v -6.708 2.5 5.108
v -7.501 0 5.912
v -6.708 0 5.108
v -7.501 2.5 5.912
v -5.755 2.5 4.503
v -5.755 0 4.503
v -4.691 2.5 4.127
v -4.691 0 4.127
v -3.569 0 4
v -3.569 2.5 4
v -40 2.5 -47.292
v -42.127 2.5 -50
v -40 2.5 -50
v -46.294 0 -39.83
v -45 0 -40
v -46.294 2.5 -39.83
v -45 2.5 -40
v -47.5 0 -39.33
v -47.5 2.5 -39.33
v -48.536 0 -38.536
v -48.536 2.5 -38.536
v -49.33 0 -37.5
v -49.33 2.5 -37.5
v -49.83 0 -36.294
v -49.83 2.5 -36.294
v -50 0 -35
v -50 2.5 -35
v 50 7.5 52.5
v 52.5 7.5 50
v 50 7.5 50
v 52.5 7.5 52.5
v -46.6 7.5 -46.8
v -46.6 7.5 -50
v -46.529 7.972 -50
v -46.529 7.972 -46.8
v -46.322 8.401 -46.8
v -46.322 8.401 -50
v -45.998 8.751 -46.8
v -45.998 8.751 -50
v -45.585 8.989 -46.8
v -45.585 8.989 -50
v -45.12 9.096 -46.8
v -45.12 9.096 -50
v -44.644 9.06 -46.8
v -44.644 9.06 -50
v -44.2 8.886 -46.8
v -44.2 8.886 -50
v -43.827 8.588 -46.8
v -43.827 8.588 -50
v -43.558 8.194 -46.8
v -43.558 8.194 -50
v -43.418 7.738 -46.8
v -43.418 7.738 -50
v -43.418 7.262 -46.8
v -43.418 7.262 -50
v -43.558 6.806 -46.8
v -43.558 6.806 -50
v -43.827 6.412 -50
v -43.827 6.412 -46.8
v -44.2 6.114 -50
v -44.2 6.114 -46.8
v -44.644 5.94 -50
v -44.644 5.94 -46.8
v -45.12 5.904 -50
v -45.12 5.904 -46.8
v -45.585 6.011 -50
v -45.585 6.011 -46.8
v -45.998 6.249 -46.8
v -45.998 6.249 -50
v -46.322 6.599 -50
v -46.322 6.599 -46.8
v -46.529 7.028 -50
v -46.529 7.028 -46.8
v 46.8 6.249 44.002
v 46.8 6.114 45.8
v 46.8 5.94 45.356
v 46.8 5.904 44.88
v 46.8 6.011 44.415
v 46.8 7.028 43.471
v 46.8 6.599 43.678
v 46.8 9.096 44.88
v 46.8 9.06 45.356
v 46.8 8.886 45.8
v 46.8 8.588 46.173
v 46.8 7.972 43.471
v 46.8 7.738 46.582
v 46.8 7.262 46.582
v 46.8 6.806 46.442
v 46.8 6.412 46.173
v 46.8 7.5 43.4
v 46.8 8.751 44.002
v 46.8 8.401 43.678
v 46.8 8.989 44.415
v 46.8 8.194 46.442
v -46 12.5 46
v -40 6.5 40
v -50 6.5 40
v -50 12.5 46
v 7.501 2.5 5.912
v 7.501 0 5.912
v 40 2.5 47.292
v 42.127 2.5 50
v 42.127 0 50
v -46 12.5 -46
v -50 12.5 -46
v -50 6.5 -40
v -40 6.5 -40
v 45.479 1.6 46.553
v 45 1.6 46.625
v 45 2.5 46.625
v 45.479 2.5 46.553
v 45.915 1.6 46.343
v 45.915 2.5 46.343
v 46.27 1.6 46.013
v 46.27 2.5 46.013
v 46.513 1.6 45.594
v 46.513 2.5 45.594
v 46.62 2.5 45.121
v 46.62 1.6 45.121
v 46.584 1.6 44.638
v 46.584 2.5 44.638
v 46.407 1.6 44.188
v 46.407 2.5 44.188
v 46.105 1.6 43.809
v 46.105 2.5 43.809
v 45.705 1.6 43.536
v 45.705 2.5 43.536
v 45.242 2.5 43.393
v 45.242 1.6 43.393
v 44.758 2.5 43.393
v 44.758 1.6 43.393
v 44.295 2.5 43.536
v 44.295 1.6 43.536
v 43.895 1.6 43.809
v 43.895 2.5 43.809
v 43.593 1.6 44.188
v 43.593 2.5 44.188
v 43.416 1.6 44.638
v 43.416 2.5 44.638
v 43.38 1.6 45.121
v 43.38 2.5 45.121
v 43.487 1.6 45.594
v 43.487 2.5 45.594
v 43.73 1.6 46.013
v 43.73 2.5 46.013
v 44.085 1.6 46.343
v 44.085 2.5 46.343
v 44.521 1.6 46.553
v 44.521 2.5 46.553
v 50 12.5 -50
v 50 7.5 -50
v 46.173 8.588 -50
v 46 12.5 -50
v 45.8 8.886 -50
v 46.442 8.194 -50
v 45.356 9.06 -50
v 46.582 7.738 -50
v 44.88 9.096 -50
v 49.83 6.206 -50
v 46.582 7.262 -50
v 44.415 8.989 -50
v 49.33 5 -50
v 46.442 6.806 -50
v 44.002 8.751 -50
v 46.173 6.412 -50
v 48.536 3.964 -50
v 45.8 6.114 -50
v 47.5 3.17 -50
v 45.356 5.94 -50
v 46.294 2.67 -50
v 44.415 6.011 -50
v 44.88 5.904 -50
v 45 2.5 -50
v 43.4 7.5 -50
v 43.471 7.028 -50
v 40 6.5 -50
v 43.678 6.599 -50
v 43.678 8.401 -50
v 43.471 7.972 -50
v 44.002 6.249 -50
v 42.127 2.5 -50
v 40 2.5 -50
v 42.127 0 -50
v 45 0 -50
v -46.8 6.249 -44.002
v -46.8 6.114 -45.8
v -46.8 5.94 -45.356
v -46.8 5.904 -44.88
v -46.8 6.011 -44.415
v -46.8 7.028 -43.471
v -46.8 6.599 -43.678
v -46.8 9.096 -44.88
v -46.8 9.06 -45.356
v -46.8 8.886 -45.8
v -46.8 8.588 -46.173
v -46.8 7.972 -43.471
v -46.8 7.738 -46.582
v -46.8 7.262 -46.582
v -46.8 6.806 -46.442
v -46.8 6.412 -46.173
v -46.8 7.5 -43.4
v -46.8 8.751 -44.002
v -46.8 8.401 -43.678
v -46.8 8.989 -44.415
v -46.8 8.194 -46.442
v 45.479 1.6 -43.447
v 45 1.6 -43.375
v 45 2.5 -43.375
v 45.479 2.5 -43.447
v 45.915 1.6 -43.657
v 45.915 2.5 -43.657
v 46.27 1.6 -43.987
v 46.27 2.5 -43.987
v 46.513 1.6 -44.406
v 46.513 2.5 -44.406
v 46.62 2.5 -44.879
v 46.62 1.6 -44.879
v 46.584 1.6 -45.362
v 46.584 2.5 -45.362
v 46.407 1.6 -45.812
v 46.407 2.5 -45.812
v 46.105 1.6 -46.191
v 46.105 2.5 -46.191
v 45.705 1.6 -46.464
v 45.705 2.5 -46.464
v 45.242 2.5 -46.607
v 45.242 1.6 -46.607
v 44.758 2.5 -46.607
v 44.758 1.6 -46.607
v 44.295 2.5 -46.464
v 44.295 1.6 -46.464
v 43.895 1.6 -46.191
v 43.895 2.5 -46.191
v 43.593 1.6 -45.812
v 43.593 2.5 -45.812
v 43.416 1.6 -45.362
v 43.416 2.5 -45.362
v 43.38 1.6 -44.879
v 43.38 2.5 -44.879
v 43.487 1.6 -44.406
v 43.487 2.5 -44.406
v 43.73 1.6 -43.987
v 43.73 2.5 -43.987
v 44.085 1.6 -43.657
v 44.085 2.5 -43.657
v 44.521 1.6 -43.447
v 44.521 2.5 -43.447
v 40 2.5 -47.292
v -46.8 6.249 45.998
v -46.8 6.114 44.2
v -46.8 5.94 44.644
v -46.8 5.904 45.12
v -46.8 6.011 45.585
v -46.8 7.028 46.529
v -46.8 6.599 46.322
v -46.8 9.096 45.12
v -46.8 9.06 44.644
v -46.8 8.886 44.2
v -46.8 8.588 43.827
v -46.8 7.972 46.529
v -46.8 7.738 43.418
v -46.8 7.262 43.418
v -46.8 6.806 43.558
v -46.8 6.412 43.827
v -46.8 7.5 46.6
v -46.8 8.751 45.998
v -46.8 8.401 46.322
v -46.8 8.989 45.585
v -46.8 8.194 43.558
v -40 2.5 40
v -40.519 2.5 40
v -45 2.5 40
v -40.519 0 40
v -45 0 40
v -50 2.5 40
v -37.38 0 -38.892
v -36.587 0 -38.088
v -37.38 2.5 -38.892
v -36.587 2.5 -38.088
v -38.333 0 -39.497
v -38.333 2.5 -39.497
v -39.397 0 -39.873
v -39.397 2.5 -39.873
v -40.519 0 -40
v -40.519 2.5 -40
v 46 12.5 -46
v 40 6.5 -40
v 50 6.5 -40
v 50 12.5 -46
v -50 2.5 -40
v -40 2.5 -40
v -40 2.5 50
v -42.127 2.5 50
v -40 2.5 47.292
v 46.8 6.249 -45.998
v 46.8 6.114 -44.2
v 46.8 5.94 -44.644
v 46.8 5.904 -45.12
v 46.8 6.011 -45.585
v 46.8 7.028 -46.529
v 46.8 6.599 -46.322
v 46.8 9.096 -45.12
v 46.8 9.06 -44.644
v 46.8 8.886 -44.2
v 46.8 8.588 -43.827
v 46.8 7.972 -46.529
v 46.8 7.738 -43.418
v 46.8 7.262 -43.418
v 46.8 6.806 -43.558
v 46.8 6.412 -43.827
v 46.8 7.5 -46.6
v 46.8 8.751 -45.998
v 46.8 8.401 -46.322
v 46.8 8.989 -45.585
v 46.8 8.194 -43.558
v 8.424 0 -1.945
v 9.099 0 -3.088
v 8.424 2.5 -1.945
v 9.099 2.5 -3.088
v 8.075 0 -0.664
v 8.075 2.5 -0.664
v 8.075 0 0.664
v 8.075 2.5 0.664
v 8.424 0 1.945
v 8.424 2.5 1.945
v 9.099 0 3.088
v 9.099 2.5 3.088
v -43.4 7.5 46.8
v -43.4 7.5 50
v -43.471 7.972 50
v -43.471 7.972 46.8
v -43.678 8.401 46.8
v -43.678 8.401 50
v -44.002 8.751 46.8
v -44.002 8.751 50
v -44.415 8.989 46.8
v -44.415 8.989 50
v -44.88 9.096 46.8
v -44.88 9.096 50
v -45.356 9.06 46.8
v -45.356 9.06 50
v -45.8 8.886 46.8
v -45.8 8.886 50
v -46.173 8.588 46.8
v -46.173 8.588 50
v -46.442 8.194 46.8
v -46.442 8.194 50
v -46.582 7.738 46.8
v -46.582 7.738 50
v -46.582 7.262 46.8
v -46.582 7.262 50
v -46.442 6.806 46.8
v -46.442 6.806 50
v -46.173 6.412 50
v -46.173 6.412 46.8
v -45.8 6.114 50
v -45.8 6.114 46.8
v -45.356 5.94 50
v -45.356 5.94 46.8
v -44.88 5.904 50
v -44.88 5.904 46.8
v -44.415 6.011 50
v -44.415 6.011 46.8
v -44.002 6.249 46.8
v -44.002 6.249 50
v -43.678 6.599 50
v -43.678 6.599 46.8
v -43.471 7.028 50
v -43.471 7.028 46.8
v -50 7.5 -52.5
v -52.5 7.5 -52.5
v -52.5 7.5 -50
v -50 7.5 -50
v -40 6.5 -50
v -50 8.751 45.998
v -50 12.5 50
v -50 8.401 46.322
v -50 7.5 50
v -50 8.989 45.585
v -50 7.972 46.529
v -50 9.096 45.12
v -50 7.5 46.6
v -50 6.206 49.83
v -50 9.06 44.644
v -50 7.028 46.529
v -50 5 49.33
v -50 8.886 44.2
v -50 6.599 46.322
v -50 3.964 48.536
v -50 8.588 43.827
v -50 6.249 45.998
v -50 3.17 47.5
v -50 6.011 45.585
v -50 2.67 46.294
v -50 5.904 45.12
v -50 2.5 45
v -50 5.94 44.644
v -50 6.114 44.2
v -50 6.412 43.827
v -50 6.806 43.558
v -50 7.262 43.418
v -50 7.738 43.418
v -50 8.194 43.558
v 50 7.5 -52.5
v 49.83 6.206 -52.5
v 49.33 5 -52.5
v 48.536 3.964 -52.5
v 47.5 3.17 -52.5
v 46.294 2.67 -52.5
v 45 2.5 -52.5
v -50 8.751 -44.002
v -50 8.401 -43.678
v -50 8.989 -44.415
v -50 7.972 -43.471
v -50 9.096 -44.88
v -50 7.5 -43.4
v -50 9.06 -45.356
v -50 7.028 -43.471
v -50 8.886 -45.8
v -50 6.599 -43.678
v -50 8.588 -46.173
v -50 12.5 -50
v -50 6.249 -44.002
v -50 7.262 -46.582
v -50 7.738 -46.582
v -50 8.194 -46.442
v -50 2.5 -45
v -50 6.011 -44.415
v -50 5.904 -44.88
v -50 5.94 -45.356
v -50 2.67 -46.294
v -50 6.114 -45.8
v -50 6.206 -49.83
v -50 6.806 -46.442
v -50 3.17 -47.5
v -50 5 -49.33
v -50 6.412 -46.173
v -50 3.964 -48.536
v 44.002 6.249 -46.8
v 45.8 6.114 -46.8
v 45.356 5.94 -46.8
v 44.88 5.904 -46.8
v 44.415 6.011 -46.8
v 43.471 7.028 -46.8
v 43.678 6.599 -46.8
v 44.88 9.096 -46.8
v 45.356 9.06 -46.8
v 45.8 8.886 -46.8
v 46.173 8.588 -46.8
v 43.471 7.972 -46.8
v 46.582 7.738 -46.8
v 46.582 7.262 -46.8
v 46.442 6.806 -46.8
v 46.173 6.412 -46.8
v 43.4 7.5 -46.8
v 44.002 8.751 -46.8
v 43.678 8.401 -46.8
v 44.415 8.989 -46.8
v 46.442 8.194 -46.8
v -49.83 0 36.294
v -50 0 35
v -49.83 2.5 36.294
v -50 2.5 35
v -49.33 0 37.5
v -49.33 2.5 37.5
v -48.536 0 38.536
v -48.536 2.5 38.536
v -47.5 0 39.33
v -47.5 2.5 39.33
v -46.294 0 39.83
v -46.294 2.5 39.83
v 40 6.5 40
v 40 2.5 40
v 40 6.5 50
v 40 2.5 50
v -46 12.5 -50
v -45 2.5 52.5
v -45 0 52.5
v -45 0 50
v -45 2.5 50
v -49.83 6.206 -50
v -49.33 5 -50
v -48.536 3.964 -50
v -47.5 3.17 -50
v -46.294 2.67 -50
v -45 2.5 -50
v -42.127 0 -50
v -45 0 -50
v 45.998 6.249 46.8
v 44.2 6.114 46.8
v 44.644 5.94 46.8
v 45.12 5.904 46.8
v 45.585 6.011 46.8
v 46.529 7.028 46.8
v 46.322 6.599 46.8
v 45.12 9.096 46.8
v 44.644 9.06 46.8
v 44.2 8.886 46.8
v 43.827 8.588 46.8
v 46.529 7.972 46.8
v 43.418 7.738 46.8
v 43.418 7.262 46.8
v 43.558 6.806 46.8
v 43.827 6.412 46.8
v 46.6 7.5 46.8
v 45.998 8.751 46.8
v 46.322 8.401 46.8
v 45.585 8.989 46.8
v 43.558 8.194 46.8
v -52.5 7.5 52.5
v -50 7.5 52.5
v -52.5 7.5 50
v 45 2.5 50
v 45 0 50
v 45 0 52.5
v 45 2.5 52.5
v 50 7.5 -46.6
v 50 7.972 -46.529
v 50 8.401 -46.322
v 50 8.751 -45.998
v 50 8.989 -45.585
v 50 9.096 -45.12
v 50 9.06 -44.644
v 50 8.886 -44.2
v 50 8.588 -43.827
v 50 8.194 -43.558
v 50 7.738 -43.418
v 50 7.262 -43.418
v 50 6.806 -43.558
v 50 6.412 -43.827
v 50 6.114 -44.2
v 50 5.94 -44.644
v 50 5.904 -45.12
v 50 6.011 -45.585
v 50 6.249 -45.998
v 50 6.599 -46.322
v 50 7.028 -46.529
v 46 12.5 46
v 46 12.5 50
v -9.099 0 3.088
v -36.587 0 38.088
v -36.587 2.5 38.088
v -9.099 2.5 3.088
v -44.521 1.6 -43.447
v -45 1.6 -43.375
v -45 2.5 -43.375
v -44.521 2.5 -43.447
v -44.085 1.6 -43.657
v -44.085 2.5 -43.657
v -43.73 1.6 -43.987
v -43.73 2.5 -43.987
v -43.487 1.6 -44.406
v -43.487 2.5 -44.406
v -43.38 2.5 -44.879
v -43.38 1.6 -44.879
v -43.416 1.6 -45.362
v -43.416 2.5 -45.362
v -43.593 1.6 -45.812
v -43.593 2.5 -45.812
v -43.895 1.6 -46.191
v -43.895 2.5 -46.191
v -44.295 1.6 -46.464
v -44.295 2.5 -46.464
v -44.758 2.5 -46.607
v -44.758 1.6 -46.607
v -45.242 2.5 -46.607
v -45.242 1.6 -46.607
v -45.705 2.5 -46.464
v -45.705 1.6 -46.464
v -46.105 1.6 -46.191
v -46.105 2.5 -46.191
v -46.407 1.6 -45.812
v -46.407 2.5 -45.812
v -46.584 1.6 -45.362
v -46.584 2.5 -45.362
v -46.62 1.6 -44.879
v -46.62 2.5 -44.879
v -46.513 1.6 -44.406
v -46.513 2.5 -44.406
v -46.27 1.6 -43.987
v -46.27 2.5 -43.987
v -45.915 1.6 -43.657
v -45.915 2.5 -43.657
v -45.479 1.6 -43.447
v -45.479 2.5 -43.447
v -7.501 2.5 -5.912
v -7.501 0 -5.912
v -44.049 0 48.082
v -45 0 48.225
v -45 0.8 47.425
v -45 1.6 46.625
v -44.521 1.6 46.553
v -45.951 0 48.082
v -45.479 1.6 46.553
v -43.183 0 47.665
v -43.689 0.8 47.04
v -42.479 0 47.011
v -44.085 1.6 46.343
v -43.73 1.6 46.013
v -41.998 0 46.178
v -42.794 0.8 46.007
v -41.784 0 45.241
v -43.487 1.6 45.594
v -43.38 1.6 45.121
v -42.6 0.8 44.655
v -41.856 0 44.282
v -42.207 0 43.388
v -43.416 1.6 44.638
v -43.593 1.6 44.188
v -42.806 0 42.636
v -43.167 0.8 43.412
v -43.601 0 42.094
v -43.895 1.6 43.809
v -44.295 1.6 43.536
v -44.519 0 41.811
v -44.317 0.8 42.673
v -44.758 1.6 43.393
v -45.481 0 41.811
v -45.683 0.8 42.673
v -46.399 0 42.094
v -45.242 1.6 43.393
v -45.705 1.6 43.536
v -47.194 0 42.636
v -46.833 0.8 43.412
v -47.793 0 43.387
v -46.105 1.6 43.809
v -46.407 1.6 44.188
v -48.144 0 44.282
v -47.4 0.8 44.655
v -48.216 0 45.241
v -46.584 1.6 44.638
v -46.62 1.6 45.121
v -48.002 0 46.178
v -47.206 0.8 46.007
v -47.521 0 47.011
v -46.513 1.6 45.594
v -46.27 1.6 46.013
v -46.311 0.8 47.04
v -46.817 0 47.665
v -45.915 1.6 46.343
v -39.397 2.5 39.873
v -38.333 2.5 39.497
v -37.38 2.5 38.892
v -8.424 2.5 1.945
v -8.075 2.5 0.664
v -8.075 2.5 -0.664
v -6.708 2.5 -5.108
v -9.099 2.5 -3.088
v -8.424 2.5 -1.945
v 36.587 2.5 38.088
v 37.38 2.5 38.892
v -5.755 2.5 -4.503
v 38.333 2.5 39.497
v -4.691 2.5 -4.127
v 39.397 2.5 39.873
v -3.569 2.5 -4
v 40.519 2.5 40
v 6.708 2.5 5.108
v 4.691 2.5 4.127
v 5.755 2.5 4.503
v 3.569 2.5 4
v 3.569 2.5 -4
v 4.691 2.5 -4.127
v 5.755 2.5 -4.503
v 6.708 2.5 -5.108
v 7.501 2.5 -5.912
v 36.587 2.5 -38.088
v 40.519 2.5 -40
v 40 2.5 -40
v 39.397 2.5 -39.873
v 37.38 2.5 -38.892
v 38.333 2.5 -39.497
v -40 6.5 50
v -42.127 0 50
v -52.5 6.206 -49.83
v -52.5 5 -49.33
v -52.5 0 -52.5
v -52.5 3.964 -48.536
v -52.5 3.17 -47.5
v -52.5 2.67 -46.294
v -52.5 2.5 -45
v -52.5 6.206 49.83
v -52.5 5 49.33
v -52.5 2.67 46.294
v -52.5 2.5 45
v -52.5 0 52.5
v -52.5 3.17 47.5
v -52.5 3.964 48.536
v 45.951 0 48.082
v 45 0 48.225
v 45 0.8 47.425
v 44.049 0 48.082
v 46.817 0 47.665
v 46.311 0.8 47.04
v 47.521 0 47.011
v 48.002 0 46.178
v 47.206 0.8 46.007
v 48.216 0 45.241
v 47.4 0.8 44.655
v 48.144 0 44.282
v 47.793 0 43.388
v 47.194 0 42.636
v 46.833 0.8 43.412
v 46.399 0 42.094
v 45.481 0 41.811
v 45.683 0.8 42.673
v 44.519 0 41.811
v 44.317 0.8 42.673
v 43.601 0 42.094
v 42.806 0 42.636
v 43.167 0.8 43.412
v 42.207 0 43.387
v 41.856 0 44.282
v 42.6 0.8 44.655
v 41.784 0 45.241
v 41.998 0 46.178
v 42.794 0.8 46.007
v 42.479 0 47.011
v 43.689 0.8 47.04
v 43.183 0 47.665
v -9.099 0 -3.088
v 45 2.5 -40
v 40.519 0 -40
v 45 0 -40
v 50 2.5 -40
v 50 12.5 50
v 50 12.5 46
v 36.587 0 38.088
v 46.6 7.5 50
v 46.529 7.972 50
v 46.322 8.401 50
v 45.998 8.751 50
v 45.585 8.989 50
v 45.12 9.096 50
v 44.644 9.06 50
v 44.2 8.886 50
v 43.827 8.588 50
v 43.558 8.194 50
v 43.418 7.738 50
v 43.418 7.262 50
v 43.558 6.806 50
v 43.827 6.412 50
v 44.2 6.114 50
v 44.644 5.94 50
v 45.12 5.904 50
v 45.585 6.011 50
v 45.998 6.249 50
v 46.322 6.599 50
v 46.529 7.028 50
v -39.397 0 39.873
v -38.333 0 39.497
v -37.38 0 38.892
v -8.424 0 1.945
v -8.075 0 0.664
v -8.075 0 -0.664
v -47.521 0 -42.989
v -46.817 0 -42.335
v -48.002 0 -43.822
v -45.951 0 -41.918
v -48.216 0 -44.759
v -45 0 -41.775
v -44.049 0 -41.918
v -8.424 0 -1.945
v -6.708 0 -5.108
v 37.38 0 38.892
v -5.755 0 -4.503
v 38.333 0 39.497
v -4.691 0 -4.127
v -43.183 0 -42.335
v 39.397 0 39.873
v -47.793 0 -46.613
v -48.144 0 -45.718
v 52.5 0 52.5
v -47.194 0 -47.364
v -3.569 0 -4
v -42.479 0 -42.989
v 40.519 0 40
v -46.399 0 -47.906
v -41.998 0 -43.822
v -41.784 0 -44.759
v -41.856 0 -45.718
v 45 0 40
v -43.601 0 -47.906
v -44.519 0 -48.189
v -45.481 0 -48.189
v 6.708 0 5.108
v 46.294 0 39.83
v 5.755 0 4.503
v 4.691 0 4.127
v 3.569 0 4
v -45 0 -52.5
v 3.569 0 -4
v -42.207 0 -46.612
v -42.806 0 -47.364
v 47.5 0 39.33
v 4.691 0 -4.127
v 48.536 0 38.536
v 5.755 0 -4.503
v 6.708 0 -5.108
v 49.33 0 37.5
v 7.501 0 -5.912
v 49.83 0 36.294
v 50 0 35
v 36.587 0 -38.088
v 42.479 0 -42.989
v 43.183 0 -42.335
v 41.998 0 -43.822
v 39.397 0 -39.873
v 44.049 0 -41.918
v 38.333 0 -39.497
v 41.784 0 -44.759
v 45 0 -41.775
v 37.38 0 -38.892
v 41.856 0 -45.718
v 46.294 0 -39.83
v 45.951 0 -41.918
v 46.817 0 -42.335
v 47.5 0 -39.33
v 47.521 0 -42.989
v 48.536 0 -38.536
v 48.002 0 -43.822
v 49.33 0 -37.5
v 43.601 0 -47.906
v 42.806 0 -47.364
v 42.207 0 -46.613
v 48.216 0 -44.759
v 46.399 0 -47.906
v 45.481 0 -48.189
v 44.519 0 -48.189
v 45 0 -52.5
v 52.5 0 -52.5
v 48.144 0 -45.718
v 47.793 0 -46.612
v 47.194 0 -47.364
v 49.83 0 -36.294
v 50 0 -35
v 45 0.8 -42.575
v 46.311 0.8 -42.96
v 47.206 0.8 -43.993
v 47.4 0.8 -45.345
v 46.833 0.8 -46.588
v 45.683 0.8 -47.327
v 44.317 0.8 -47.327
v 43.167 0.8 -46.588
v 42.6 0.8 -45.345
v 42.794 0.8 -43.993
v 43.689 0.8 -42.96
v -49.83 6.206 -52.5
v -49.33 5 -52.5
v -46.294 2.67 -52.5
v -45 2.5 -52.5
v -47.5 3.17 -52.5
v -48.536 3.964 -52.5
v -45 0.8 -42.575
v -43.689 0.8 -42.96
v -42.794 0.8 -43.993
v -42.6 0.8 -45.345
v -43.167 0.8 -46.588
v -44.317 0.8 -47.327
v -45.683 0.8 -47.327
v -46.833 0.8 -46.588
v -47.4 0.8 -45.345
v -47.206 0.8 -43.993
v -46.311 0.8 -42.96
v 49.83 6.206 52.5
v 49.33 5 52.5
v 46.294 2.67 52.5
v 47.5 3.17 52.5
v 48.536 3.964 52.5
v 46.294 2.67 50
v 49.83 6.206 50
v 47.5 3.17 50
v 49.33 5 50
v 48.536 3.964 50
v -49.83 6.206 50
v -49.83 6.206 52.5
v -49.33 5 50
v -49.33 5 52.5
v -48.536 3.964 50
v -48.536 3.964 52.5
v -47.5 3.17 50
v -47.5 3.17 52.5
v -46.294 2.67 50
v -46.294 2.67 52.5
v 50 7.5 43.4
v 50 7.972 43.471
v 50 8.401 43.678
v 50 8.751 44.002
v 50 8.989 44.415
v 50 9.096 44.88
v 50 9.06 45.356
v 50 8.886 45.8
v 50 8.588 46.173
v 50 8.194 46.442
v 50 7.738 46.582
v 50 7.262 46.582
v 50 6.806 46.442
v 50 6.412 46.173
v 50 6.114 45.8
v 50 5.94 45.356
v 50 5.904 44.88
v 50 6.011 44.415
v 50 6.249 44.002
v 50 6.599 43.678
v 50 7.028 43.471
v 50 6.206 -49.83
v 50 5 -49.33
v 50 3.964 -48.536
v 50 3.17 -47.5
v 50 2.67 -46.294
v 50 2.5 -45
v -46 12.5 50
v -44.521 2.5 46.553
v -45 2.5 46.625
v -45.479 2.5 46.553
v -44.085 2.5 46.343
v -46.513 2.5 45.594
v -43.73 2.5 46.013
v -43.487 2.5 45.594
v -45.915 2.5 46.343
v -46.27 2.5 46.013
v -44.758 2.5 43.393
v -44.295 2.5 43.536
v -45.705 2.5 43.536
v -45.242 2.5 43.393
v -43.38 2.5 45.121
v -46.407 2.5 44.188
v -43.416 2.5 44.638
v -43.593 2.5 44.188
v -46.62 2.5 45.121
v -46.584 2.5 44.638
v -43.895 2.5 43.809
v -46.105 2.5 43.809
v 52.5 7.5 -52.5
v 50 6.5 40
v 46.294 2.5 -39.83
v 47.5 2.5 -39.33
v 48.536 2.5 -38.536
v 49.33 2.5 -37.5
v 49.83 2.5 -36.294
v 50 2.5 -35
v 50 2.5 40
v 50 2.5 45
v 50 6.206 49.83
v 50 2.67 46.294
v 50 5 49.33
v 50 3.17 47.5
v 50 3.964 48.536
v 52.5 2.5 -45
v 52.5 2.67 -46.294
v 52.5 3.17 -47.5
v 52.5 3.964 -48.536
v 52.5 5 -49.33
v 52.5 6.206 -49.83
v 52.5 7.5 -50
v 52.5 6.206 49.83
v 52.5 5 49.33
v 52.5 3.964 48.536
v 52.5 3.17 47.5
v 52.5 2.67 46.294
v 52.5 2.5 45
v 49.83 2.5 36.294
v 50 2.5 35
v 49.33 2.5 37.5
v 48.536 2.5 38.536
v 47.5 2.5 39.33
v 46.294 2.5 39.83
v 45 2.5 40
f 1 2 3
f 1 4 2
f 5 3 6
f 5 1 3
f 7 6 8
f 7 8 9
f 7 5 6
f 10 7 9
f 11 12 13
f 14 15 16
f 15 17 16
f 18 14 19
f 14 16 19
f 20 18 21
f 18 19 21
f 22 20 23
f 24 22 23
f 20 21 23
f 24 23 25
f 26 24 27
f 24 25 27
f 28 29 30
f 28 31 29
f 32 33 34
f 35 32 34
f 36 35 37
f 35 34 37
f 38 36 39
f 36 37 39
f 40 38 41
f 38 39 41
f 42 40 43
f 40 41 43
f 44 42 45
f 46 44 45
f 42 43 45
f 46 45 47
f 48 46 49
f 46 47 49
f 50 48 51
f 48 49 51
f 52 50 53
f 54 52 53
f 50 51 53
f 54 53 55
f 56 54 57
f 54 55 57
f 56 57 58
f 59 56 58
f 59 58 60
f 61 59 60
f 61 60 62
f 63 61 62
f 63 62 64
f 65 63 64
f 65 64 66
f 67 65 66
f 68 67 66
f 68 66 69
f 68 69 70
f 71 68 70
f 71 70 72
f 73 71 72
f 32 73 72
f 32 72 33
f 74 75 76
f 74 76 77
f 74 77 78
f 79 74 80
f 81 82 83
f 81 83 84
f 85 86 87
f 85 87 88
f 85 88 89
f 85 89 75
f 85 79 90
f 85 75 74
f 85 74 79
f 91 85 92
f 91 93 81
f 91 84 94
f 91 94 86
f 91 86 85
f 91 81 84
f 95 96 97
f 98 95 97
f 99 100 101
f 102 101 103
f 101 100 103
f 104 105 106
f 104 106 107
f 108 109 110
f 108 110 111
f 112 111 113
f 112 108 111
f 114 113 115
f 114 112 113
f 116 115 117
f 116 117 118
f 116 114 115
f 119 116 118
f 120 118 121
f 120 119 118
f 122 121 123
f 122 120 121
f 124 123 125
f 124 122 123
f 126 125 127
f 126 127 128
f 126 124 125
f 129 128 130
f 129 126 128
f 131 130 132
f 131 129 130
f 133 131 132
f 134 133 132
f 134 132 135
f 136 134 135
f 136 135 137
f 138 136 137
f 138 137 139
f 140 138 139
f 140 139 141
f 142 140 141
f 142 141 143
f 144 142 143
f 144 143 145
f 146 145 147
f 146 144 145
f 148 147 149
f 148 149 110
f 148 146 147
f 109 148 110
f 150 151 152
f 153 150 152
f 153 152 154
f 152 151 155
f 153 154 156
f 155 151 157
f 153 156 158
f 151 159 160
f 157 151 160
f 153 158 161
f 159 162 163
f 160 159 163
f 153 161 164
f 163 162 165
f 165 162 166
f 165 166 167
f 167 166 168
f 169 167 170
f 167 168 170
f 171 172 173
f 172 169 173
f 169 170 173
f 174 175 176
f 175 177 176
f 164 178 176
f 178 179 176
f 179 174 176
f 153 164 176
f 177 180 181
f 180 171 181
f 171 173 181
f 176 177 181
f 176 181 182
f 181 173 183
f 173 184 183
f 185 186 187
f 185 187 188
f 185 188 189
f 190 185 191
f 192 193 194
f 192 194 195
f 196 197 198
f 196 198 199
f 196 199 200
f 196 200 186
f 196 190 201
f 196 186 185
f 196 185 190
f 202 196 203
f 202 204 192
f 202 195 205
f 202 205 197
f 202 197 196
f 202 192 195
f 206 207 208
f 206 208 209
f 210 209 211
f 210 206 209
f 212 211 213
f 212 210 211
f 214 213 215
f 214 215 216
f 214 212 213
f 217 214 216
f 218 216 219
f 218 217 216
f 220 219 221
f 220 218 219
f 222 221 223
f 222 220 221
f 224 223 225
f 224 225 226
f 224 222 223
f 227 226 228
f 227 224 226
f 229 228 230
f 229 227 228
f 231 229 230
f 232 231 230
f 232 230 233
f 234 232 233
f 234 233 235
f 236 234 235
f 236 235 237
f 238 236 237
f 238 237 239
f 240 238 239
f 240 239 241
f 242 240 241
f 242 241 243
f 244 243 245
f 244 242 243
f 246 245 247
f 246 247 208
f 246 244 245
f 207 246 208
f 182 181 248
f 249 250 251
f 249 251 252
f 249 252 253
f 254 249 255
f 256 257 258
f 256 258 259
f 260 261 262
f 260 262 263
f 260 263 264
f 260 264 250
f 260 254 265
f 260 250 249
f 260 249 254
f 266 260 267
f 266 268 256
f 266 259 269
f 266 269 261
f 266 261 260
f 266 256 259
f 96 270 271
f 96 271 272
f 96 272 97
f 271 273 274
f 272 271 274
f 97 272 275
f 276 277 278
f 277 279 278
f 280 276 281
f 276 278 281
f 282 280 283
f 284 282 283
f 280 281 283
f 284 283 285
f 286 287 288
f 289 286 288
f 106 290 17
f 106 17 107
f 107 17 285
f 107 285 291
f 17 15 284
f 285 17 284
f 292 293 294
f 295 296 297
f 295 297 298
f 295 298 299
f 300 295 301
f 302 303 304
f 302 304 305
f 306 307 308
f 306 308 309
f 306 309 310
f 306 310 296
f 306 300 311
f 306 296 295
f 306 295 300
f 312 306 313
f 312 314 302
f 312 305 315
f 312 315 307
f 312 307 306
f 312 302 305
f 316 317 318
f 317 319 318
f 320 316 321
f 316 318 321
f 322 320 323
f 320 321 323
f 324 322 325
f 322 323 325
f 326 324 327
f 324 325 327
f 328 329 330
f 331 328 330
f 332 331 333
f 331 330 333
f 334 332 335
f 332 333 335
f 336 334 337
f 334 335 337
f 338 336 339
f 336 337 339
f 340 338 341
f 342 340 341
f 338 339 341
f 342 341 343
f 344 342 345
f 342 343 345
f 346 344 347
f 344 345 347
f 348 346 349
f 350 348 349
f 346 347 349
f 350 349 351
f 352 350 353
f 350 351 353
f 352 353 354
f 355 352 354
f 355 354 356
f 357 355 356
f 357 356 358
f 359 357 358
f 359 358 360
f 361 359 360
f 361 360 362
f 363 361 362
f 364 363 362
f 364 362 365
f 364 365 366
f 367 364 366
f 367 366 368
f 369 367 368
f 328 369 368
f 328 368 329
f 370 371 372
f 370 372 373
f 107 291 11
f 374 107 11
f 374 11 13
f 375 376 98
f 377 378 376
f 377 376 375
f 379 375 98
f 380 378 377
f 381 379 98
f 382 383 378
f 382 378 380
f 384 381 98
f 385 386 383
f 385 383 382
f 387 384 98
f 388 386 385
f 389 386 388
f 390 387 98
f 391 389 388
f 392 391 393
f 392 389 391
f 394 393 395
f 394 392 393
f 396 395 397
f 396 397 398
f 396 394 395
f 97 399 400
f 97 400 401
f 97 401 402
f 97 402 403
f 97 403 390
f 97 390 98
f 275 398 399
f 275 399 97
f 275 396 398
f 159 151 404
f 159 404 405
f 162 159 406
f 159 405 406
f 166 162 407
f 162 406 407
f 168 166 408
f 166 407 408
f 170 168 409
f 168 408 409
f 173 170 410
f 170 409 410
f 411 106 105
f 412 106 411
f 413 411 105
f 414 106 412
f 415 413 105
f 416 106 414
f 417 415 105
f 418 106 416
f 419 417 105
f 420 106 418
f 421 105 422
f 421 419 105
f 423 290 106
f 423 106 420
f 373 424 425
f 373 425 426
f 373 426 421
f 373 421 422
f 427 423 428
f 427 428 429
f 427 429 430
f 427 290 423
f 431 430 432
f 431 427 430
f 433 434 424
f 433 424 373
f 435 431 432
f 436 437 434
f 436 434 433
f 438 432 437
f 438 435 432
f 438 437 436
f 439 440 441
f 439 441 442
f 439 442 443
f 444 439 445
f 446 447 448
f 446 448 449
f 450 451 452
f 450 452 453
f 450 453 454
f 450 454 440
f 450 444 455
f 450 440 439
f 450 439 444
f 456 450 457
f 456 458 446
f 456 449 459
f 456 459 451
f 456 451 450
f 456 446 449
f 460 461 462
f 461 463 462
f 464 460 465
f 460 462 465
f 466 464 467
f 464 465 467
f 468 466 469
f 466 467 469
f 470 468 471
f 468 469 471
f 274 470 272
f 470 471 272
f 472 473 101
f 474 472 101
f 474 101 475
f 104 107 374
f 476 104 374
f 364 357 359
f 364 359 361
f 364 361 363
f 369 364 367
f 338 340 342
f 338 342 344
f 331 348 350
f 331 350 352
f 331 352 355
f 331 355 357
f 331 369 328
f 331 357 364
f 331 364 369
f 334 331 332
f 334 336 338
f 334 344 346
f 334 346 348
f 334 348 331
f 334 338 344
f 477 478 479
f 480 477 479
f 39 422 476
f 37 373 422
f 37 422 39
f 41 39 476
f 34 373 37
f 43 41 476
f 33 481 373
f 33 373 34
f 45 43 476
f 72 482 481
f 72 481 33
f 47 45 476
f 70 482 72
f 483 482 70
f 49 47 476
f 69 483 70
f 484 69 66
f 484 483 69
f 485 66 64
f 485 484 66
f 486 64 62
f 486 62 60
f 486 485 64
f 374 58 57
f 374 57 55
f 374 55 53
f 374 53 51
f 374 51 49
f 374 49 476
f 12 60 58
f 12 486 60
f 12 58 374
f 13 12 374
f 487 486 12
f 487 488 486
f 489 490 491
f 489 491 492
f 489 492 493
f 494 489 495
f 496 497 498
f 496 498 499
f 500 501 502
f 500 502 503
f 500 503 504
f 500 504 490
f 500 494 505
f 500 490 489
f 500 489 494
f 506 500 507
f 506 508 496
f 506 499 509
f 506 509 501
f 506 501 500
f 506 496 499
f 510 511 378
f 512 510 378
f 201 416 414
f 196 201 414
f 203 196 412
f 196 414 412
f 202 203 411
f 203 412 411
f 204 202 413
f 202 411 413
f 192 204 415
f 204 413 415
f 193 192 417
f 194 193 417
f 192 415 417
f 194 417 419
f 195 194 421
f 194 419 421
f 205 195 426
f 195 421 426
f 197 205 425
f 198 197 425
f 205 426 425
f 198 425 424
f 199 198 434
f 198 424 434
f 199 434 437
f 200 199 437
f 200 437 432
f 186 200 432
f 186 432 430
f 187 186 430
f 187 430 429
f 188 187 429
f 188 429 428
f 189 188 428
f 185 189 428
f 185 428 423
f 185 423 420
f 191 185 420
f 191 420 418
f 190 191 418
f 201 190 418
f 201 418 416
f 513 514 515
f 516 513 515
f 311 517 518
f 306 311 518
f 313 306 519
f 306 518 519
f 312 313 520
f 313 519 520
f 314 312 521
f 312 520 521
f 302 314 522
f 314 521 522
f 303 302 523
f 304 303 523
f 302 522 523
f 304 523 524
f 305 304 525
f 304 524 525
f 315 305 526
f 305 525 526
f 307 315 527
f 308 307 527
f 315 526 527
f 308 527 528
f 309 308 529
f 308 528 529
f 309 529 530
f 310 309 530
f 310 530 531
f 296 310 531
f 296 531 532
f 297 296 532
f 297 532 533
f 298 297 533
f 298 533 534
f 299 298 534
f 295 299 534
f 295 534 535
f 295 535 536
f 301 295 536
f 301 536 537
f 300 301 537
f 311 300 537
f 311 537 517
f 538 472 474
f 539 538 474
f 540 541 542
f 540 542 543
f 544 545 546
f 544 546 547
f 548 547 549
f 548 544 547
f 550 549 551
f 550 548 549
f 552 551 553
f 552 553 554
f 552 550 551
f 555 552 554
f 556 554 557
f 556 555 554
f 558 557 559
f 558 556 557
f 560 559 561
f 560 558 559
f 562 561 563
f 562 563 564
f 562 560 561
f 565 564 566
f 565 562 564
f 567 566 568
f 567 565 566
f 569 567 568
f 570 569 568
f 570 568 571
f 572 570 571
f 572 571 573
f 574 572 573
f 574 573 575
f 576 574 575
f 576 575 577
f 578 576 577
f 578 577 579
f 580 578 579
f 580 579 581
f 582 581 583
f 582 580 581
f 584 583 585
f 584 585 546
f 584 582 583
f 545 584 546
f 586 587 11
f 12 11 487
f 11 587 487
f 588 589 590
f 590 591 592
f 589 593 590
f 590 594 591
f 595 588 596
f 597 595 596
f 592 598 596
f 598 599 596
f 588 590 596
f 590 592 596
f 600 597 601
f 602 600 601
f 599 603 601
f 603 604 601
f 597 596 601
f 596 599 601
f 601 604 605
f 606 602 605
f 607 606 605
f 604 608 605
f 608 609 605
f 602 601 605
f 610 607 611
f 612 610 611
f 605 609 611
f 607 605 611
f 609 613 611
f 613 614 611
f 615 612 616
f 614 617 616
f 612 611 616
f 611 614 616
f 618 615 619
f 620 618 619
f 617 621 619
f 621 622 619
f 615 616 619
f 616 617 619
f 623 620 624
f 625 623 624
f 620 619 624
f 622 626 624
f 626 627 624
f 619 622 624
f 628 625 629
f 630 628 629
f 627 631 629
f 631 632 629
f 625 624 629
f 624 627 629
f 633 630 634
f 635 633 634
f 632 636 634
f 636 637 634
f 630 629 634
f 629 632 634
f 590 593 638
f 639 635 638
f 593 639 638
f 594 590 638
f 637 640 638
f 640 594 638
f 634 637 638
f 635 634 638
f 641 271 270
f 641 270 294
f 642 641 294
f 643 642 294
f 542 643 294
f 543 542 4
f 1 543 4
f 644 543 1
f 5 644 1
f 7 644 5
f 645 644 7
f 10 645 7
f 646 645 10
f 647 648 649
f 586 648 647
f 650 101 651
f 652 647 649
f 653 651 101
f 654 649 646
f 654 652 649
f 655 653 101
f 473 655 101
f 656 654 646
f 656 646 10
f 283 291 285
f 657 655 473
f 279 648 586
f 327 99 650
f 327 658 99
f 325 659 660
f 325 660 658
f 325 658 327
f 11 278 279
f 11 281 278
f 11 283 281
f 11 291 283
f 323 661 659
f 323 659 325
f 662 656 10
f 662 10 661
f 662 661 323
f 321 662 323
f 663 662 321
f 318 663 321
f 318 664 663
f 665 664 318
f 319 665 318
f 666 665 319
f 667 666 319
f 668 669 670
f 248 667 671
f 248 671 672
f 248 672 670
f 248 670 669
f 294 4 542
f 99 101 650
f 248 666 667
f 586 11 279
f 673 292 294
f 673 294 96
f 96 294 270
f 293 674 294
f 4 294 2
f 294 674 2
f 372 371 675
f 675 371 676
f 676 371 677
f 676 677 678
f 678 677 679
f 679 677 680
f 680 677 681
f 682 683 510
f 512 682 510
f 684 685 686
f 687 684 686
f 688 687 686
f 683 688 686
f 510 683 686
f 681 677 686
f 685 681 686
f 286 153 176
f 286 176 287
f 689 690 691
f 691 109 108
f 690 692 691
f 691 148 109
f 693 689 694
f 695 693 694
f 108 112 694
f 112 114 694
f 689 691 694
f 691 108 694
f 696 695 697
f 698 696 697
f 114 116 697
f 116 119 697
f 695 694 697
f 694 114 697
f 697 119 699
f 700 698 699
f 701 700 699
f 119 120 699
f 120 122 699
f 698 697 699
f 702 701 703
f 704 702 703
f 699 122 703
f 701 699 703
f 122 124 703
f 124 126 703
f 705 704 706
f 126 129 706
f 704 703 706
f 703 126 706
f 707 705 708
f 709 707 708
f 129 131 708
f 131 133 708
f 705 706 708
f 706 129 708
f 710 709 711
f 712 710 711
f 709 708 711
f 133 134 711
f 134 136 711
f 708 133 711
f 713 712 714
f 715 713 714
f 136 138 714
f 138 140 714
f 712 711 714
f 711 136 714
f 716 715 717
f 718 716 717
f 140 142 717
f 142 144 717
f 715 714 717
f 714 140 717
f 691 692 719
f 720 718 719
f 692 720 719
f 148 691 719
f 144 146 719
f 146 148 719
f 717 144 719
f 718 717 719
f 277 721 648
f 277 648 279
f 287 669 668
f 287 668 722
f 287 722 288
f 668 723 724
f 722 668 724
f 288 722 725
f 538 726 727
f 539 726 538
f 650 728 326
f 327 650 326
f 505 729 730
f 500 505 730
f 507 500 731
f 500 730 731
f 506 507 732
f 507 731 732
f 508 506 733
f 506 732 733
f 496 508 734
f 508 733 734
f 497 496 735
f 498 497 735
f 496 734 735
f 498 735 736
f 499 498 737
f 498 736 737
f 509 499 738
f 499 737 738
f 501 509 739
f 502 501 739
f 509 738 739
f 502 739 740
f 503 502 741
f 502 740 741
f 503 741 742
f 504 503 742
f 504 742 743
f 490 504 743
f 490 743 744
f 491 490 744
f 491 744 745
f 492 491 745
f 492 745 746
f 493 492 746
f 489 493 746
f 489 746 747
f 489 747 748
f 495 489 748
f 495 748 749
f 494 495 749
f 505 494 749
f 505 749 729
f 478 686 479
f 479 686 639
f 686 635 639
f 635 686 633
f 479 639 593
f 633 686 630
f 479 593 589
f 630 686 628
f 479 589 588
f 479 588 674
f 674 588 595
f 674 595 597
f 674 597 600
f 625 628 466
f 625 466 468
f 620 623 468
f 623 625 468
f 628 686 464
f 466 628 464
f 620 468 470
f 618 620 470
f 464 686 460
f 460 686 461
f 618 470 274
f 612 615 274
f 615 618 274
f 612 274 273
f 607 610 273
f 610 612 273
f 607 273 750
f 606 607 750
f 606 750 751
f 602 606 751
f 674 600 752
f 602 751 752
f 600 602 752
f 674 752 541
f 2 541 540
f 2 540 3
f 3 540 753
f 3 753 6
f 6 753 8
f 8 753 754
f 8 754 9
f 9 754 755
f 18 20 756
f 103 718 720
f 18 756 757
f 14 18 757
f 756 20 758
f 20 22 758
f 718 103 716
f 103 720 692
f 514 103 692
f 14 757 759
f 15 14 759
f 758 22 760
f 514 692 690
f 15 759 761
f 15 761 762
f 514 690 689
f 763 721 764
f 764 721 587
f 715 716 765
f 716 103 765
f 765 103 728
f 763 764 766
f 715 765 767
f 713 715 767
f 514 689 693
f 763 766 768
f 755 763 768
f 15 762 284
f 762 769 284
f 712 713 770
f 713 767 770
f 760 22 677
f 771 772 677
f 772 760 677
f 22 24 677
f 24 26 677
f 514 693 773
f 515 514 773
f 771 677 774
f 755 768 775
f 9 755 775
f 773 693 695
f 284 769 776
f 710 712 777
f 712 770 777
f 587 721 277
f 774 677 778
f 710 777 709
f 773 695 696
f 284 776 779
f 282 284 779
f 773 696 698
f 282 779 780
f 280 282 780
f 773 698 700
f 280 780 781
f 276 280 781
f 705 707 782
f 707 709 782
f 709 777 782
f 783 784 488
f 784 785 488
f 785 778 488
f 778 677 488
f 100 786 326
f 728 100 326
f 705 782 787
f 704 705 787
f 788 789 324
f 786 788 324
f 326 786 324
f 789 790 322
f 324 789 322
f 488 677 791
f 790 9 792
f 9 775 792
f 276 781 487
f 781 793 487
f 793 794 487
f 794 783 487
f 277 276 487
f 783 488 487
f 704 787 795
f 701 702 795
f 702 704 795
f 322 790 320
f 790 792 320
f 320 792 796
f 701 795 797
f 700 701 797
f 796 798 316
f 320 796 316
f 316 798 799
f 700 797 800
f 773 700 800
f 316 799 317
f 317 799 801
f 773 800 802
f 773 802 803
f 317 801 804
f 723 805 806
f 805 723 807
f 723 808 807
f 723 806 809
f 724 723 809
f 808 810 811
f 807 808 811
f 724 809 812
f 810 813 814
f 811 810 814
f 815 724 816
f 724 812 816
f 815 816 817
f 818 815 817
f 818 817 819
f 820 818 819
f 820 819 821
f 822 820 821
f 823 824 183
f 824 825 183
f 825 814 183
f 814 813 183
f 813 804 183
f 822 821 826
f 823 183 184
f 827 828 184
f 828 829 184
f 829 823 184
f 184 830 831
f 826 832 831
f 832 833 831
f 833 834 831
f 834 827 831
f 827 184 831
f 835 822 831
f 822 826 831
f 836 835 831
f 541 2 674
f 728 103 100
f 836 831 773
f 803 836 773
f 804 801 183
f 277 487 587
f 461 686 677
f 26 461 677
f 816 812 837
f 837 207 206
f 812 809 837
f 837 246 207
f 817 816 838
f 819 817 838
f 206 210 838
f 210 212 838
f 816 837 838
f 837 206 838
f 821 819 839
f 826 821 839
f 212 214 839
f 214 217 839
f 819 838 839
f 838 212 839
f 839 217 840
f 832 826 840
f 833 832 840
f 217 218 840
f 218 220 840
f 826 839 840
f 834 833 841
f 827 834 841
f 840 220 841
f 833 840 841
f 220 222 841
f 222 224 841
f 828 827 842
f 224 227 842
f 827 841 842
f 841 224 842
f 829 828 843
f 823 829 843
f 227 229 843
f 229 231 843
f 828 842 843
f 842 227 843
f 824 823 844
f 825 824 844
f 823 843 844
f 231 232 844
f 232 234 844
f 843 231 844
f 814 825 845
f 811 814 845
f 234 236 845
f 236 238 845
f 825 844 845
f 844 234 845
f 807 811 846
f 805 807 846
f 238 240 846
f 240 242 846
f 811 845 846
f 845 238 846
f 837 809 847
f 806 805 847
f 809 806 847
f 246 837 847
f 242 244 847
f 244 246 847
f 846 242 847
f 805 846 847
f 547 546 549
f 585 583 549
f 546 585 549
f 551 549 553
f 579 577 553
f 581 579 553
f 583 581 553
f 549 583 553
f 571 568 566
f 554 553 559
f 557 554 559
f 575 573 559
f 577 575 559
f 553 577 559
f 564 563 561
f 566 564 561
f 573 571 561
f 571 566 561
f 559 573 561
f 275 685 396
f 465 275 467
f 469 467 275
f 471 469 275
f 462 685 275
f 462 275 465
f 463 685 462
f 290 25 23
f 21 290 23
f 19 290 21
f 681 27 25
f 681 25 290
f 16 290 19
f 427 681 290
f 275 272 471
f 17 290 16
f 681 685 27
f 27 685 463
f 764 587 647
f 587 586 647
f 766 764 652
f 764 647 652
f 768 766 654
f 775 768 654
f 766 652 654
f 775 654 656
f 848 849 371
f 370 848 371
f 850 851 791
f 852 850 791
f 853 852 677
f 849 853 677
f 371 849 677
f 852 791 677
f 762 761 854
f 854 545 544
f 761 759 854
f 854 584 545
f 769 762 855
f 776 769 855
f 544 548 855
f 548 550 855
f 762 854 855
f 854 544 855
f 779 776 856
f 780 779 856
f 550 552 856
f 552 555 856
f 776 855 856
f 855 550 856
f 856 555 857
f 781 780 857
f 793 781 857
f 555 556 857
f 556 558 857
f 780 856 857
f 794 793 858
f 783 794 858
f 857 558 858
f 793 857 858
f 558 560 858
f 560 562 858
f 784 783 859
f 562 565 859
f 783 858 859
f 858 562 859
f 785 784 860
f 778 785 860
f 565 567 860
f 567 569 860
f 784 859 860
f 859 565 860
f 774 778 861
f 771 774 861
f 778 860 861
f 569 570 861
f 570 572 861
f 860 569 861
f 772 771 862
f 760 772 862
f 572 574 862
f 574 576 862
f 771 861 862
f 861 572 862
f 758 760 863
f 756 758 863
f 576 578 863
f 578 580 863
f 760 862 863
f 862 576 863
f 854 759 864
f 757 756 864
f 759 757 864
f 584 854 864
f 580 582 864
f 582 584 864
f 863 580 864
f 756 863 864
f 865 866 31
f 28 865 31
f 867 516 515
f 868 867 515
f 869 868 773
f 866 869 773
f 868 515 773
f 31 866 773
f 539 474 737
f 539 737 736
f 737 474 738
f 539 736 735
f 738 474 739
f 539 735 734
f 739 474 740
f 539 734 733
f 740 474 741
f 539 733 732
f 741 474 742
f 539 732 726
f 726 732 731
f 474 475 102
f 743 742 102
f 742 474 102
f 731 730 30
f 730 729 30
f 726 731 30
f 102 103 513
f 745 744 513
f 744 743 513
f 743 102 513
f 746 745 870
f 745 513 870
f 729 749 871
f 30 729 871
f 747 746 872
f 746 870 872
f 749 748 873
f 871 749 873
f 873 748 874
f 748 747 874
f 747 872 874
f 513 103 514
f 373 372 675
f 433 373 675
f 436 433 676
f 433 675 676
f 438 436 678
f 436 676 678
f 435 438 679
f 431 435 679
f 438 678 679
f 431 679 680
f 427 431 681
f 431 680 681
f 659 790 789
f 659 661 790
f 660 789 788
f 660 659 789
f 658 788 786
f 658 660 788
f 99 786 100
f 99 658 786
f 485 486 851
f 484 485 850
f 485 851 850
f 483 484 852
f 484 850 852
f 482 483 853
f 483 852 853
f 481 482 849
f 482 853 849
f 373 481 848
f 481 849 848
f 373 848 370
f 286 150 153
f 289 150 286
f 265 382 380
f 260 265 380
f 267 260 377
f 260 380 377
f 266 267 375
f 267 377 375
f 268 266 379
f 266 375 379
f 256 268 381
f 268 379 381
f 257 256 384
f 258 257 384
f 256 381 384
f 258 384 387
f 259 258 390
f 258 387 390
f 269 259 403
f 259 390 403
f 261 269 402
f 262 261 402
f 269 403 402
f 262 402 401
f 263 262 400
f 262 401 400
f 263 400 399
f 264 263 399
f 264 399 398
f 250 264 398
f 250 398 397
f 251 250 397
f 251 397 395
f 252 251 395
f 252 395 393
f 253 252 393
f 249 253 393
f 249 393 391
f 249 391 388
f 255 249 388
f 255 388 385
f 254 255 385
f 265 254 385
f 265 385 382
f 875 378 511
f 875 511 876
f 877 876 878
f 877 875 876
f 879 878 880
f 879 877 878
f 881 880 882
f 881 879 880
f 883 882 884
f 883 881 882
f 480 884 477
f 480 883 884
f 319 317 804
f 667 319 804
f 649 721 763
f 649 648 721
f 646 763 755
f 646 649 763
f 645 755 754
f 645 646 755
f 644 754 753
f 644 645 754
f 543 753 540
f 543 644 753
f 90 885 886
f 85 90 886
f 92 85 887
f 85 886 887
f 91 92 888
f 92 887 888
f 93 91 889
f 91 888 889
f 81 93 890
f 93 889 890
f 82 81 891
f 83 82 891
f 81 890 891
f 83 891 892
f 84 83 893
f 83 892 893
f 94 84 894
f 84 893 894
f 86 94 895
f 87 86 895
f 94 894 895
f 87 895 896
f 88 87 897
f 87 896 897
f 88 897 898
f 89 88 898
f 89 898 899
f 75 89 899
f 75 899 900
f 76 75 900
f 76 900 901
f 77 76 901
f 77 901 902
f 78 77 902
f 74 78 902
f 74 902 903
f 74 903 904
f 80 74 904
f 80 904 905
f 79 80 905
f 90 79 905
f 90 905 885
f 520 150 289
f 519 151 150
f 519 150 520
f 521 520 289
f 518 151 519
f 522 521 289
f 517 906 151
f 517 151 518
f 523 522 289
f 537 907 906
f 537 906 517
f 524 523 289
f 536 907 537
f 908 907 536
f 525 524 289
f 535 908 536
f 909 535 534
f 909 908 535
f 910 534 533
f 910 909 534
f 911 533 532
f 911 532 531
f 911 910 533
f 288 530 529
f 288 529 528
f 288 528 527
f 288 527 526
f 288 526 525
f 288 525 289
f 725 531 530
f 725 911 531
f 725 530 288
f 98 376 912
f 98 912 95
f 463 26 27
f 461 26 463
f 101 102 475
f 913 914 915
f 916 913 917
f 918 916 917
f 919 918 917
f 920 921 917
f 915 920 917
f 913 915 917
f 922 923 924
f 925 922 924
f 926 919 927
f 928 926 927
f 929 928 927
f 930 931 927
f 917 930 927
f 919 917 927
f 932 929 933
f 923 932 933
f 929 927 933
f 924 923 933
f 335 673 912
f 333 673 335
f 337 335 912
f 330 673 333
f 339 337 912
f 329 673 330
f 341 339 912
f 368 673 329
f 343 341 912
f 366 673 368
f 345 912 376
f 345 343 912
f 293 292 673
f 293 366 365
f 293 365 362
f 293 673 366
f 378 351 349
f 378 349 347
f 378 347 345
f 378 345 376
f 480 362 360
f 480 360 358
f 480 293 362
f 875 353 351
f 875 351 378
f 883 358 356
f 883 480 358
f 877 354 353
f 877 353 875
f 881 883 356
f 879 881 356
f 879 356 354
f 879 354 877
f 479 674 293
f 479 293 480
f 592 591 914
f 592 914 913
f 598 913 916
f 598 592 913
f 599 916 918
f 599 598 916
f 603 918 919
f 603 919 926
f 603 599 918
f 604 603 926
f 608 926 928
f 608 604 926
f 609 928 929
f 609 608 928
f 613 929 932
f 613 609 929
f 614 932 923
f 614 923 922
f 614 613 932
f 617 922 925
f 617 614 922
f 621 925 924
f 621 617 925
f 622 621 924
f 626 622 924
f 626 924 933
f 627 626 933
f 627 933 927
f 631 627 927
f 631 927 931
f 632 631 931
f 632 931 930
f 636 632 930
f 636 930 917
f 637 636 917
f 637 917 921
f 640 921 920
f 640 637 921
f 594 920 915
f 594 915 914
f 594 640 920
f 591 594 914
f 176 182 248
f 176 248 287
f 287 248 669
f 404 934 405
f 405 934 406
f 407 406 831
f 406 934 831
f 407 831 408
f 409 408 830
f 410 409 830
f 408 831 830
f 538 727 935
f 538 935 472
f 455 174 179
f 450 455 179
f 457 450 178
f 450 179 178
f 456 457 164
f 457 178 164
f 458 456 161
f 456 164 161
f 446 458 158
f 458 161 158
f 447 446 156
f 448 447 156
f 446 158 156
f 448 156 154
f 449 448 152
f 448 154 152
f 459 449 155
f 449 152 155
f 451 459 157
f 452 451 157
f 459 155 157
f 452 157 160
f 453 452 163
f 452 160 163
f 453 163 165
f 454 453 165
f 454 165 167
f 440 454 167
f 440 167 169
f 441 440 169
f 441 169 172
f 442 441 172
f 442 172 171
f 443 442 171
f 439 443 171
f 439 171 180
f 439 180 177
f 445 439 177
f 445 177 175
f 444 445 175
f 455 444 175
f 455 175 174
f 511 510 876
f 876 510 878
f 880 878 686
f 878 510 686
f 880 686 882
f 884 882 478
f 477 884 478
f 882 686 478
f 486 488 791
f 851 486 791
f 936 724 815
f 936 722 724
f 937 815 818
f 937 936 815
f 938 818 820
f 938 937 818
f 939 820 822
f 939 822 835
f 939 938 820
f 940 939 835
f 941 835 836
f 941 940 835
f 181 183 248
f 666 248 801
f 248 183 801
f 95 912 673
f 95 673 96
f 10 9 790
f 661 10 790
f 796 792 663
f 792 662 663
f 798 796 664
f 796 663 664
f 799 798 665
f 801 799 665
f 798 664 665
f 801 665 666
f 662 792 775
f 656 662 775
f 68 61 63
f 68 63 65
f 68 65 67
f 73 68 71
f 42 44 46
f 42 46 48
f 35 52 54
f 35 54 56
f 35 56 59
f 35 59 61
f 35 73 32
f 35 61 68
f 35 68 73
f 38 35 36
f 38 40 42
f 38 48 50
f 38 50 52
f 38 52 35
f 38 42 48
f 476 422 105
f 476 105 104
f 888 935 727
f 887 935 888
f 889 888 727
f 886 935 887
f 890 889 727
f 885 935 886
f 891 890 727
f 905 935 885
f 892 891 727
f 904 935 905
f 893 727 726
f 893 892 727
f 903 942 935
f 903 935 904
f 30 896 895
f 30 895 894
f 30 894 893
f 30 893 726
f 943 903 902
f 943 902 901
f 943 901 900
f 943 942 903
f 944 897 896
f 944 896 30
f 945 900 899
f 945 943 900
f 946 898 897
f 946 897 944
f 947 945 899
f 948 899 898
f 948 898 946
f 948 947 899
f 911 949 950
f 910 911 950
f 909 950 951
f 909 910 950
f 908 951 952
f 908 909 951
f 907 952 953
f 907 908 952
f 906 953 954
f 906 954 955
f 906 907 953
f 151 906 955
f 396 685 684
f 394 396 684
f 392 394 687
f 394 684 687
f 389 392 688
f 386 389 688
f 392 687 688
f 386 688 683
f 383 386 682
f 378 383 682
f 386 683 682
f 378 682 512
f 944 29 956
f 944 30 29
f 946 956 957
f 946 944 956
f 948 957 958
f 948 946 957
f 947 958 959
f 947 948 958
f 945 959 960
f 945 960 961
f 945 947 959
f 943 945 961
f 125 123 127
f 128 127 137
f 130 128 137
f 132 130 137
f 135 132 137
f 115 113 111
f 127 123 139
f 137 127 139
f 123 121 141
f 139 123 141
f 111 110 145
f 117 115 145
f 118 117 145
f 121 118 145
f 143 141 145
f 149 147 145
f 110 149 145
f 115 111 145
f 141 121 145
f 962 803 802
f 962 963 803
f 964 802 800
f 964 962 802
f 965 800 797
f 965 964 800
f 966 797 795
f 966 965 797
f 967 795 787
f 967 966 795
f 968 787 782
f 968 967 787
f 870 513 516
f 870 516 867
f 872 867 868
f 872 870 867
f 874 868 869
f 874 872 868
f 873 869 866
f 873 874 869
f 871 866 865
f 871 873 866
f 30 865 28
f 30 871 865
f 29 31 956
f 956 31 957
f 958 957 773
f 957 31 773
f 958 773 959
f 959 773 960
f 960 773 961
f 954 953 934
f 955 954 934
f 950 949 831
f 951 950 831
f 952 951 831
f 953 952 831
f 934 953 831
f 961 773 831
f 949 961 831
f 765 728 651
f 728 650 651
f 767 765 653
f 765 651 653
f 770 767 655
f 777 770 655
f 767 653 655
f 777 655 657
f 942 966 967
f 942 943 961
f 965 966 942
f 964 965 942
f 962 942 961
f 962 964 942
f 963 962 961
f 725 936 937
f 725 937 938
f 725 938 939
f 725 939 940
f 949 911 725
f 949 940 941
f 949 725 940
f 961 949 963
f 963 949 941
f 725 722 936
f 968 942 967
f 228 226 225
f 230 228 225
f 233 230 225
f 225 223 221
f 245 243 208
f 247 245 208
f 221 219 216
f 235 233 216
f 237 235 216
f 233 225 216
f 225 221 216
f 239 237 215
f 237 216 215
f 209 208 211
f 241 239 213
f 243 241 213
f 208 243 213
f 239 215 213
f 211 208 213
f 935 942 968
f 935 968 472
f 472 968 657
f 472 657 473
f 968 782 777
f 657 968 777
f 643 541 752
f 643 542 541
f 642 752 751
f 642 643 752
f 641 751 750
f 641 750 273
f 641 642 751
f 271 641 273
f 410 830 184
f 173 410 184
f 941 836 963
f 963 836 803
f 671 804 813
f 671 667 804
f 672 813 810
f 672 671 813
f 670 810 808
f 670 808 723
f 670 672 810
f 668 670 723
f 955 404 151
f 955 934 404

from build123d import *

# Parameters (mm, degrees)
SKETCH1_R                    = 1.625
BOSS_EXTRUDE1_DEPTH          = 2.5
FILLET1_R                    = 5
FILLET2_R                    = 5
CHAMFER2_SIZE                = 1.6
SKETCH2_W                    = 10
SKETCH2_H                    = 10
BOSS_EXTRUDE2_DEPTH          = 10
SKETCH3_R                    = 1.6
CUT_EXTRUDE1_DEPTH           = 3.2
SKETCH4_R                    = 1.6
CUT_EXTRUDE2_DEPTH           = 3.2
CHAMFER1_SIZE                = 6
BOSS_EXTRUDE3_DEPTH          = 5
CIRPATTERN1_COUNT            = 4
CHAMFER1_OF_CIRPATTERN1_SIZE = 6
SKETCH7_R                    = 5
CUT_EXTRUDE5_DEPTH           = 2.5
SKETCH6_R                    = 5
CUT_EXTRUDE6_DEPTH           = 2.5
CUT_EXTRUDE7_START           = -2.5
SKETCH8_R                    = 5
CUT_EXTRUDE7_DEPTH           = 2.5
CUT_EXTRUDE8_START           = -2.5
SKETCH9_R                    = 5
CUT_EXTRUDE8_DEPTH           = 2.5


with BuildPart() as part:
    # Sketch1 → Boss-Extrude1 (new body)
    with BuildSketch(Plane(origin=(0, 0, 0), x_dir=(1, 0, 0), z_dir=(0, 1, 0))):
        Polygon((-52.5, 45), (-52.5, -45), (-52.5, -52.5), (-45, -52.5), (-45, -50), (-42.127158908, -50), (-6, -4), (6, -4), (42.127158908, -50), (45, -50), (45, -52.5), (52.5, -52.5), (52.5, -45), (52.5, 45), (52.5, 52.5), (45, 52.5), (45, 50), (42.127158908, 50), (6, 4), (-6, 4), (-42.127158908, 50), (-45, 50), (-45, 52.5), (-52.5, 52.5), align=None)
        with Locations(Location((-45, 45, 0), (0, 0, 270))):
            Circle(SKETCH1_R, mode=Mode.SUBTRACT)
        with Locations(Location((45, 45, 0), (0, 0, 270))):
            Circle(SKETCH1_R, mode=Mode.SUBTRACT)
        with Locations(Location((45, -45, 0), (0, 0, 270))):
            Circle(SKETCH1_R, mode=Mode.SUBTRACT)
        with Locations(Location((-45, -45, 0), (0, 0, 270))):
            Circle(SKETCH1_R, mode=Mode.SUBTRACT)
        Polygon((-50, 40), (-50, -40), (-38.088044946, -40), (-6.673124156, 0), (-38.088044946, 40), align=None, mode=Mode.SUBTRACT)
        Polygon((50, -40), (38.088044946, -40), (6.673124156, 0), (38.088044946, 40), (50, 40), align=None, mode=Mode.SUBTRACT)
    extrude(amount=BOSS_EXTRUDE1_DEPTH)

    # Fillet1
    fillet1_edges = [part.edges().sort_by_distance(p)[0] for p in [
        (6, 1.25, 4),
        (-6, 1.25, 4),
        (-6, 1.25, -4),
        (6, 1.25, -4),
        (-6.673124156, 1.25, 0),
        (6.673124156, 1.25, 0),
    ]]
    fillet(fillet1_edges, radius=FILLET1_R)

    # Fillet2
    fillet2_edges = [part.edges().sort_by_distance(p)[0] for p in [
        (-38.088044946, 1.25, -40),
        (-50, 1.25, -40),
        (-50, 1.25, 40),
        (-38.088044946, 1.25, 40),
        (50, 1.25, 40),
        (50, 1.25, -40),
        (38.088044946, 1.25, -40),
        (38.088044946, 1.25, 40),
    ]]
    fillet(fillet2_edges, radius=FILLET2_R)

    # Chamfer2
    chamfer2_edges = [part.edges().sort_by_distance(p)[0] for p in [
        (-45, 0, -46.625),
        (45, 0, -46.625),
        (45, 0, 43.375),
        (-45, 0, 43.375),
    ]]
    chamfer(chamfer2_edges, length=CHAMFER2_SIZE)

    # Sketch2 → Boss-Extrude2 (add)
    with BuildSketch(Plane(origin=(0, 2.5, 0), x_dir=(1, 0, 0), z_dir=(0, 1, 0))):
        with Locations((-45, 45)):
            Rectangle(SKETCH2_W, SKETCH2_H)
    boss_extrude2 = extrude(amount=BOSS_EXTRUDE2_DEPTH)

    # Sketch3 → Cut-Extrude1 (cut)
    with BuildSketch(Plane.ZY.offset(50)):
        with Locations((-45, 7.5)):
            Circle(SKETCH3_R)
    cut_extrude1 = extrude(amount=-CUT_EXTRUDE1_DEPTH, mode=Mode.SUBTRACT)

    # Sketch4 → Cut-Extrude2 (cut)
    with BuildSketch(Plane(origin=(0, 0, -50), x_dir=(-1, 0, 0), z_dir=(0, 0, -1))):
        with Locations((45, 7.5)):
            Circle(SKETCH4_R)
    cut_extrude2 = extrude(amount=-CUT_EXTRUDE2_DEPTH, mode=Mode.SUBTRACT)

    # Chamfer1
    chamfer1_edges = [part.edges().sort_by_distance(p)[0] for p in [
        (-40, 12.5, -45),
        (-45, 12.5, -40),
    ]]
    chamfer(chamfer1_edges, length=CHAMFER1_SIZE)

    # Sketch5 → Boss-Extrude3 (add)
    with BuildSketch(Plane(origin=(0, 2.5, 0), x_dir=(1, 0, 0), z_dir=(0, 1, 0))):
        Polygon((-45, 50), (-45, 52.5), (-52.5, 52.5), (-52.5, 45), (-50, 45), (-50, 50), align=None)
    boss_extrude3 = extrude(amount=BOSS_EXTRUDE3_DEPTH)

    # CirPattern1: Boss-Extrude2, Cut-Extrude1, Cut-Extrude2, Boss-Extrude3 ×4 about axis
    cirpattern1_axis = Axis((0, 0, 0), (0, 1, 0))
    add([boss_extrude2.rotate(cirpattern1_axis, i * 360 / CIRPATTERN1_COUNT) for i in range(1, CIRPATTERN1_COUNT)])
    add([cut_extrude1.rotate(cirpattern1_axis, i * 360 / CIRPATTERN1_COUNT) for i in range(1, CIRPATTERN1_COUNT)], mode=Mode.SUBTRACT)
    add([cut_extrude2.rotate(cirpattern1_axis, i * 360 / CIRPATTERN1_COUNT) for i in range(1, CIRPATTERN1_COUNT)], mode=Mode.SUBTRACT)
    add([boss_extrude3.rotate(cirpattern1_axis, i * 360 / CIRPATTERN1_COUNT) for i in range(1, CIRPATTERN1_COUNT)])

    # Chamfer1 of CirPattern1
    chamfer1_of_cirpattern1_edges = [part.edges().sort_by_distance(p)[0] for p in [
        (-45, 12.5, 40),
        (-40, 12.5, 45),
        (40, 12.5, 45),
        (45, 12.5, 40),
        (45, 12.5, -40),
        (40, 12.5, -45),
    ]]
    chamfer(chamfer1_of_cirpattern1_edges, length=CHAMFER1_OF_CIRPATTERN1_SIZE)

    # Sketch7 → Cut-Extrude5 (cut)
    with BuildSketch(Plane(origin=(0, 0, -52.5), x_dir=(-1, 0, 0), z_dir=(0, 0, -1))):
        with Locations((45, 7.5)):
            Circle(SKETCH7_R)
        with Locations((-45, 7.5)):
            Circle(SKETCH7_R)
    extrude(amount=-CUT_EXTRUDE5_DEPTH, mode=Mode.SUBTRACT)

    # Sketch6 → Cut-Extrude6 (cut)
    with BuildSketch(Plane.ZY.offset(52.5)):
        with Locations((-45, 7.5)):
            Circle(SKETCH6_R)
        with Locations((45, 7.5)):
            Circle(SKETCH6_R)
    extrude(amount=-CUT_EXTRUDE6_DEPTH, mode=Mode.SUBTRACT)

    # Sketch8 → Cut-Extrude7 (cut)
    with BuildSketch(Plane.XY.offset(52.5).offset(CUT_EXTRUDE7_START)):
        with Locations((-45, 7.5)):
            Circle(SKETCH8_R)
        with Locations((45, 7.5)):
            Circle(SKETCH8_R)
    extrude(amount=CUT_EXTRUDE7_DEPTH, mode=Mode.SUBTRACT)

    # Sketch9 → Cut-Extrude8 (cut)
    with BuildSketch(Plane(origin=(52.5, 0, 0), x_dir=(0, 0, -1), z_dir=(1, 0, 0)).offset(CUT_EXTRUDE8_START)):
        with Locations((-45, 7.5)):
            Circle(SKETCH9_R)
        with Locations((45, 7.5)):
            Circle(SKETCH9_R)
    extrude(amount=CUT_EXTRUDE8_DEPTH, mode=Mode.SUBTRACT)


solid = part.part
